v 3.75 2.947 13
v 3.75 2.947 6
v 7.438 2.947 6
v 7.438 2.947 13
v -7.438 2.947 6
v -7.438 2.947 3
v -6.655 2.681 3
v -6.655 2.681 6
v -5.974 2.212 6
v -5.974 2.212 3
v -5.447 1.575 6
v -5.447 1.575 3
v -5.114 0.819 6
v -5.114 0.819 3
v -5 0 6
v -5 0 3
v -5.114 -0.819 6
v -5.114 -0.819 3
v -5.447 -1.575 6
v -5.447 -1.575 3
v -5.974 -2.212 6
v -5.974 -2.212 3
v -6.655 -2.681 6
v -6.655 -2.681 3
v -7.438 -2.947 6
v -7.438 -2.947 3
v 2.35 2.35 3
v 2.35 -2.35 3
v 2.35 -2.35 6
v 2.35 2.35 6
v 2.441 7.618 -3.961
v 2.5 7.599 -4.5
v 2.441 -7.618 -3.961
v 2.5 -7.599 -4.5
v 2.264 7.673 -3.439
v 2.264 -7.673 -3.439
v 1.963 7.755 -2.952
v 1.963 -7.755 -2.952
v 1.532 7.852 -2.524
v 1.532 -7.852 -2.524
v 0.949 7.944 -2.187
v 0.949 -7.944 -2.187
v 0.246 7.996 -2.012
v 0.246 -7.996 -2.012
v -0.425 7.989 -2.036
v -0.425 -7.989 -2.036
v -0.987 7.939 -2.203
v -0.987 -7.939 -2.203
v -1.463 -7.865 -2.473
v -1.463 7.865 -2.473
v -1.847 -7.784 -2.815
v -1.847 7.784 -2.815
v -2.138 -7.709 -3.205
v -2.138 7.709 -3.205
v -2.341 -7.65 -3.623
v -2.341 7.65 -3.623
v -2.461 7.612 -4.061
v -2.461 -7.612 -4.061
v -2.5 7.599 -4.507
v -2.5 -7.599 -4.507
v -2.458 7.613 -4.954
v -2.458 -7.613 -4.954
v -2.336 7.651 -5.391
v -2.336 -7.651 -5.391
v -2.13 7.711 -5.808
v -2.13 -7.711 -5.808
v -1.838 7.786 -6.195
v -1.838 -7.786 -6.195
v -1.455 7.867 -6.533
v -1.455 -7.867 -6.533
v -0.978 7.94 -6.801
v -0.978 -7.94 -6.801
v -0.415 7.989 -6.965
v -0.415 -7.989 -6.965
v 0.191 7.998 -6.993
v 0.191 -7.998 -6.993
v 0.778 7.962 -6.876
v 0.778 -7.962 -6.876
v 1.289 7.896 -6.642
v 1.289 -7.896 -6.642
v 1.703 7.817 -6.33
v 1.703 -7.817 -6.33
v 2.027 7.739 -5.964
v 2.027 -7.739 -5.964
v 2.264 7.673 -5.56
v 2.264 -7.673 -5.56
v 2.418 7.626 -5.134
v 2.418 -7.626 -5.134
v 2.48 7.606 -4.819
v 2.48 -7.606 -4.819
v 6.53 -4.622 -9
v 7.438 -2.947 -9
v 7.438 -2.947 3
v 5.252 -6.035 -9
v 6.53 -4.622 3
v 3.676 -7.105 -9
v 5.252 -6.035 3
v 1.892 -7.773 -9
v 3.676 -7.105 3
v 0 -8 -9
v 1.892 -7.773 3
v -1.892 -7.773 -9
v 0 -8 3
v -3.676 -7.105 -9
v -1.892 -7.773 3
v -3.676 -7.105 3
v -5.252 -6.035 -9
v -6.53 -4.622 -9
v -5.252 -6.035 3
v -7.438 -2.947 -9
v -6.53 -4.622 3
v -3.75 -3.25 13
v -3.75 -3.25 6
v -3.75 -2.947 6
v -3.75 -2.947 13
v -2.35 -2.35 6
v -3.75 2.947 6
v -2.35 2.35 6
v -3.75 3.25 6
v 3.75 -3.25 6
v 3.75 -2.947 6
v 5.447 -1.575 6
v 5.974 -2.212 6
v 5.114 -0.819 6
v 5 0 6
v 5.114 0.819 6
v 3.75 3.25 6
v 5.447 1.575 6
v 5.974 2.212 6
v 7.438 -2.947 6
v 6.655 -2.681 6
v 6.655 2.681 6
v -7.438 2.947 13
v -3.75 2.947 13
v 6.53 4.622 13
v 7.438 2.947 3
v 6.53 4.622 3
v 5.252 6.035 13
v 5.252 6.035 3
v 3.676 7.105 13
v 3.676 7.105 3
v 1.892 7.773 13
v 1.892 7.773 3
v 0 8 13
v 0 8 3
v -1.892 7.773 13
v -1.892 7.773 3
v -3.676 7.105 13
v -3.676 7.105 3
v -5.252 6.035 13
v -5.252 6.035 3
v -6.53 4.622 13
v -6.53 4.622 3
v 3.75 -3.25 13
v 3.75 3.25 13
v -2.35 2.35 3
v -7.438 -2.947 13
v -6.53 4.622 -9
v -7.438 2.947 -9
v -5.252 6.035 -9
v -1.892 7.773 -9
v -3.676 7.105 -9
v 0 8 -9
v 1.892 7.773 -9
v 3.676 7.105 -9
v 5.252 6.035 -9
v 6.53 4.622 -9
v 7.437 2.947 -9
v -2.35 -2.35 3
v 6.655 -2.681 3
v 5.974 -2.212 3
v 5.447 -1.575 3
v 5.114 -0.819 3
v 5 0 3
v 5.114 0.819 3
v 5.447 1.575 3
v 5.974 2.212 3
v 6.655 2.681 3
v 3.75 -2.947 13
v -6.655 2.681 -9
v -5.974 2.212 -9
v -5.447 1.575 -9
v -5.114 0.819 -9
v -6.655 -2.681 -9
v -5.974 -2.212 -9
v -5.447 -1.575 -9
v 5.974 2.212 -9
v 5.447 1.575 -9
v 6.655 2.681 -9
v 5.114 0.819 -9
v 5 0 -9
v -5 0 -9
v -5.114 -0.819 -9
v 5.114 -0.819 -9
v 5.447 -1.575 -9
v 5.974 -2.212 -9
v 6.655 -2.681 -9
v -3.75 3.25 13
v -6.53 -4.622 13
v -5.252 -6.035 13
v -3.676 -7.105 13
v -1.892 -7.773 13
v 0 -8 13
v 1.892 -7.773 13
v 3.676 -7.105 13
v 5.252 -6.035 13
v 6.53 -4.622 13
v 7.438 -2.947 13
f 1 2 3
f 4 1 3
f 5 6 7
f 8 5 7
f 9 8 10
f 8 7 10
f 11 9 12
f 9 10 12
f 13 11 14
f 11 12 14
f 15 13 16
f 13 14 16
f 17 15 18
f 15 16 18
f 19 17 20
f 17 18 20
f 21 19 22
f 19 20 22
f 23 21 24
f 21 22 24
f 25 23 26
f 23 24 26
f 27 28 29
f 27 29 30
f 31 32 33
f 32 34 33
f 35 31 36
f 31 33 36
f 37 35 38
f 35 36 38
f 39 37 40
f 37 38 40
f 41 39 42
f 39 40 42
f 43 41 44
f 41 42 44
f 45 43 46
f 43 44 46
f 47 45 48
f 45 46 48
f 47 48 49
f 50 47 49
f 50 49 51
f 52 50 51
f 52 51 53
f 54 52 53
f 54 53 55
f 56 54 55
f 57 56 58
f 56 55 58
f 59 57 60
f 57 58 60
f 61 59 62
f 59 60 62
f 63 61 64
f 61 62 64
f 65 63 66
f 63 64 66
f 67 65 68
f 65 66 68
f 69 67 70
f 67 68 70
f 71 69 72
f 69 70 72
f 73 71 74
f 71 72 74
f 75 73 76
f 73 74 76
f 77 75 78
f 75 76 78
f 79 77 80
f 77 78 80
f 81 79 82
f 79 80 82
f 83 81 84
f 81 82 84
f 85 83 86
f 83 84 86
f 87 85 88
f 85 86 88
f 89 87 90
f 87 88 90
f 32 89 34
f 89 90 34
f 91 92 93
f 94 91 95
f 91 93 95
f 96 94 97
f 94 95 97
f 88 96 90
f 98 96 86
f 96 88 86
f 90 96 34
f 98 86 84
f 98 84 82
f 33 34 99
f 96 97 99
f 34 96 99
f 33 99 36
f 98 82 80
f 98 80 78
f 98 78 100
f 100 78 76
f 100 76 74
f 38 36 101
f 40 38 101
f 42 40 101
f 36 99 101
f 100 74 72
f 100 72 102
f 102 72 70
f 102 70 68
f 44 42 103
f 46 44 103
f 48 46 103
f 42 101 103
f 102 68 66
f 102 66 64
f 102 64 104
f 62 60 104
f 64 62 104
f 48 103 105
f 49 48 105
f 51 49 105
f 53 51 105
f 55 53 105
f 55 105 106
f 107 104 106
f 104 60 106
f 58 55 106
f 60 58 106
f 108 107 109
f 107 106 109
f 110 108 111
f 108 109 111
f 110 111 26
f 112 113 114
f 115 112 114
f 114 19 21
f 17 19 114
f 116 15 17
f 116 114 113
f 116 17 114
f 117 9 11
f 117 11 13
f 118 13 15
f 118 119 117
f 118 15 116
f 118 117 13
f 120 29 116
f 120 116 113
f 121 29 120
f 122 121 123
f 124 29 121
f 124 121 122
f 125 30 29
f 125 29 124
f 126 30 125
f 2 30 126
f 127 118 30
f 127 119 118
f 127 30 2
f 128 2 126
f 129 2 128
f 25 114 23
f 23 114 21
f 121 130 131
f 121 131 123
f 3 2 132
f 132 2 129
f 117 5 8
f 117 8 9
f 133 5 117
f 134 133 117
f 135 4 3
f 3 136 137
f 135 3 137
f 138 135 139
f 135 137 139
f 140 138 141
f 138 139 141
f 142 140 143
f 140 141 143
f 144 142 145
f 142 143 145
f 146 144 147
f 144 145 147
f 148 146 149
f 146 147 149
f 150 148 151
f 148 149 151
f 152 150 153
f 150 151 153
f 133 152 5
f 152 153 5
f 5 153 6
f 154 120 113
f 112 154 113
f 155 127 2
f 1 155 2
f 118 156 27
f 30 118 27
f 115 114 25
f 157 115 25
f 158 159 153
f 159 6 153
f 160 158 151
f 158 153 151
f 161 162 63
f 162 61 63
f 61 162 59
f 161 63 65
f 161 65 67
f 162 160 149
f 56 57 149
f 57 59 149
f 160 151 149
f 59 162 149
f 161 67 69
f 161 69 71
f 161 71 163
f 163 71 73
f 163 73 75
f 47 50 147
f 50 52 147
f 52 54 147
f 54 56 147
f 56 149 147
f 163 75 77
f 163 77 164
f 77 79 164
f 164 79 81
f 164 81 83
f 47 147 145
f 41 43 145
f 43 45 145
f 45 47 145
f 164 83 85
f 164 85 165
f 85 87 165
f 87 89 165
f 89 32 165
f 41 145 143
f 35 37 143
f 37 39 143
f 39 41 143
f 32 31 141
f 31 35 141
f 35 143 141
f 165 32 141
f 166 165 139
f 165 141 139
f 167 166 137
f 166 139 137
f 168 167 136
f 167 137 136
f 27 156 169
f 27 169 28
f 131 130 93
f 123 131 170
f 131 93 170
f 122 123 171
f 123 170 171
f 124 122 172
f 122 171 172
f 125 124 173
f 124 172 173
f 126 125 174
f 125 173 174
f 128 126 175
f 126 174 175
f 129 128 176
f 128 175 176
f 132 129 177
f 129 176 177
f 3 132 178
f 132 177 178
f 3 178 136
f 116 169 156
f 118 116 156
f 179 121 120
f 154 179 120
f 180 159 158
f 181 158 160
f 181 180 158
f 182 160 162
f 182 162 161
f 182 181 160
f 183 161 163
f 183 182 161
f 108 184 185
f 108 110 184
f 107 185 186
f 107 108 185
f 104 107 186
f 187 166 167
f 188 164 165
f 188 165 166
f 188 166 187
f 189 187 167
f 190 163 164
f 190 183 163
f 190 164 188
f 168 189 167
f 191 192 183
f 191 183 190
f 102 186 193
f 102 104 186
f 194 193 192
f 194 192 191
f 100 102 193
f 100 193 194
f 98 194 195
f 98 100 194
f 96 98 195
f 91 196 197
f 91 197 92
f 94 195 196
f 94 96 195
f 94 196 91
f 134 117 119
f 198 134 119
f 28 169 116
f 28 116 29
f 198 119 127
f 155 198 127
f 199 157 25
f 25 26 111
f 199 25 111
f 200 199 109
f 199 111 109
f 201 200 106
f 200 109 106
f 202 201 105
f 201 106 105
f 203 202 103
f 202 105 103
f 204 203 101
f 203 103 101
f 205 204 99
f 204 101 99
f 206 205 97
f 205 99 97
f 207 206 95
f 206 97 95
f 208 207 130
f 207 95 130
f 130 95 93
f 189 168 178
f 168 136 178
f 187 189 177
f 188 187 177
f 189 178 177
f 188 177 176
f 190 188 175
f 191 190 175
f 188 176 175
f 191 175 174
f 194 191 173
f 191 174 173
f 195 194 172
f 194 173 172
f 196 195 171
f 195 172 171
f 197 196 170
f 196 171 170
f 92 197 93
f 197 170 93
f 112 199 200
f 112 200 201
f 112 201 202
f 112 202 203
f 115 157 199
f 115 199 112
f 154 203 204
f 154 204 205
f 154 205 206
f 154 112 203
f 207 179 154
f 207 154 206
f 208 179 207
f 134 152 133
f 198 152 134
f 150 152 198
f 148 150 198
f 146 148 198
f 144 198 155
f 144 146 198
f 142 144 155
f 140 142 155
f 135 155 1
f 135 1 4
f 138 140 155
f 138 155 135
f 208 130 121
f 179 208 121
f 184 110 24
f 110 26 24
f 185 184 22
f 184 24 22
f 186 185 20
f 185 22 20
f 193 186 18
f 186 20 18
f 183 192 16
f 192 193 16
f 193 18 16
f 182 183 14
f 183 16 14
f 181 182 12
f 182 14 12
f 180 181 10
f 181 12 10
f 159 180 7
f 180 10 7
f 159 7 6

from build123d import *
from build123d import SkipClean  # not in build123d's __all__

# Parameters (mm, degrees)
F0_R           = 8
F1_DEPTH       = 3
F2_R           = 8
F3_DEPTH       = 9
F4_R           = 3
F5_DEPTH       = 12.5
F7_DEPTH       = 10
F8_W           = 4.7
F8_H           = 4.7
F9_DEPTH       = 3
F10_R          = 2.5
F11_DEPTH      = 8.001
F11_DEPTH_BACK = 25


# Not quite as in the source:
# - after a boolean that leaves OpenCascade's solid faulty, fix() repairs it


with BuildPart() as f1:
    # F0 (on Top) → F1 (new body)
    with BuildSketch(Plane.XY):
        Circle(F0_R)
    extrude(amount=F1_DEPTH)

    # F2 (on face) → F3 (join)
    with BuildSketch(Plane(origin=(0, 0, 0), x_dir=(1, 0, 0), z_dir=(0, 0, -1))):
        Circle(F2_R)
    extrude(amount=F3_DEPTH)

    # F4 (on face) → F5 (cut, symmetric)
    with BuildSketch(Plane.XY.offset(3)):
        with Locations((-8, 0)):
            Circle(F4_R)
        with Locations((8, 0)):
            Circle(F4_R)
    extrude(amount=F5_DEPTH, both=True, mode=Mode.SUBTRACT)

    # F6 (on face) → F7 (join)
    with BuildSketch(Plane.XY.offset(3)):
        with BuildLine():
            ThreePointArc((-7.4375, -2.9467938085), (0, -8), (7.4375, -2.9467938085))
            Line((7.4375, -2.9467938085), (3.75, -2.9467938085))
            Line((3.75, -2.9467938085), (3.75, -3.25))
            Line((3.75, -3.25), (-3.75, -3.25))
            Line((-3.75, -3.25), (-3.75, -2.9467938085))
            Line((-3.75, -2.9467938085), (-7.4375, -2.9467938085))
        make_face()
        with BuildLine():
            Line((-3.75, 3.25), (3.75, 3.25))
            Line((3.75, 3.25), (3.75, 2.9467938085))
            Line((3.75, 2.9467938085), (7.4375, 2.9467938085))
            ThreePointArc((7.4375, 2.9467938085), (0, 8), (-7.4375, 2.9467938085))
            Line((-7.4375, 2.9467938085), (-3.75, 2.9467938085))
            Line((-3.75, 2.9467938085), (-3.75, 3.25))
        make_face()
    extrude(amount=F7_DEPTH)

    # F8 (on face) → F9 (join)
    with BuildSketch(Plane.XY.offset(3)):
        with BuildLine():
            ThreePointArc((-7.4375, 2.9467938085), (-5, 0), (-7.4375, -2.9467938085))
            Line((-7.4375, -2.9467938085), (-3.75, -2.9467938085))
            Line((-3.75, -2.9467938085), (-3.75, -3.25))
            Line((-3.75, -3.25), (3.75, -3.25))
            Line((3.75, -3.25), (3.75, -2.9467938085))
            Line((3.75, -2.9467938085), (7.4375, -2.9467938085))
            ThreePointArc((7.4375, -2.9467938085), (5, 0), (7.4375, 2.9467938085))
            Line((7.4375, 2.9467938085), (3.75, 2.9467938085))
            Line((3.75, 2.9467938085), (3.75, 3.25))
            Line((3.75, 3.25), (-3.75, 3.25))
            Line((-3.75, 3.25), (-3.75, 2.9467938085))
            Line((-3.75, 2.9467938085), (-7.4375, 2.9467938085))
        make_face()
        Rectangle(F8_W, F8_H, mode=Mode.SUBTRACT)
    with SkipClean():  # cleaning this boolean's faces spoils the solid; the shape is the same uncleaned
        extrude(amount=F9_DEPTH)

    # F10 (on Front) → F11 (cut, two sides)
    with BuildSketch(Plane.XZ) as f11_sk:
        with Locations((0, -4.5)):
            Circle(F10_R)
    extrude(amount=-F11_DEPTH, mode=Mode.SUBTRACT)
    extrude(f11_sk.sketch, amount=F11_DEPTH_BACK, mode=Mode.SUBTRACT)

    add(f1.part.fix(), mode=Mode.REPLACE)


solid = f1.part
